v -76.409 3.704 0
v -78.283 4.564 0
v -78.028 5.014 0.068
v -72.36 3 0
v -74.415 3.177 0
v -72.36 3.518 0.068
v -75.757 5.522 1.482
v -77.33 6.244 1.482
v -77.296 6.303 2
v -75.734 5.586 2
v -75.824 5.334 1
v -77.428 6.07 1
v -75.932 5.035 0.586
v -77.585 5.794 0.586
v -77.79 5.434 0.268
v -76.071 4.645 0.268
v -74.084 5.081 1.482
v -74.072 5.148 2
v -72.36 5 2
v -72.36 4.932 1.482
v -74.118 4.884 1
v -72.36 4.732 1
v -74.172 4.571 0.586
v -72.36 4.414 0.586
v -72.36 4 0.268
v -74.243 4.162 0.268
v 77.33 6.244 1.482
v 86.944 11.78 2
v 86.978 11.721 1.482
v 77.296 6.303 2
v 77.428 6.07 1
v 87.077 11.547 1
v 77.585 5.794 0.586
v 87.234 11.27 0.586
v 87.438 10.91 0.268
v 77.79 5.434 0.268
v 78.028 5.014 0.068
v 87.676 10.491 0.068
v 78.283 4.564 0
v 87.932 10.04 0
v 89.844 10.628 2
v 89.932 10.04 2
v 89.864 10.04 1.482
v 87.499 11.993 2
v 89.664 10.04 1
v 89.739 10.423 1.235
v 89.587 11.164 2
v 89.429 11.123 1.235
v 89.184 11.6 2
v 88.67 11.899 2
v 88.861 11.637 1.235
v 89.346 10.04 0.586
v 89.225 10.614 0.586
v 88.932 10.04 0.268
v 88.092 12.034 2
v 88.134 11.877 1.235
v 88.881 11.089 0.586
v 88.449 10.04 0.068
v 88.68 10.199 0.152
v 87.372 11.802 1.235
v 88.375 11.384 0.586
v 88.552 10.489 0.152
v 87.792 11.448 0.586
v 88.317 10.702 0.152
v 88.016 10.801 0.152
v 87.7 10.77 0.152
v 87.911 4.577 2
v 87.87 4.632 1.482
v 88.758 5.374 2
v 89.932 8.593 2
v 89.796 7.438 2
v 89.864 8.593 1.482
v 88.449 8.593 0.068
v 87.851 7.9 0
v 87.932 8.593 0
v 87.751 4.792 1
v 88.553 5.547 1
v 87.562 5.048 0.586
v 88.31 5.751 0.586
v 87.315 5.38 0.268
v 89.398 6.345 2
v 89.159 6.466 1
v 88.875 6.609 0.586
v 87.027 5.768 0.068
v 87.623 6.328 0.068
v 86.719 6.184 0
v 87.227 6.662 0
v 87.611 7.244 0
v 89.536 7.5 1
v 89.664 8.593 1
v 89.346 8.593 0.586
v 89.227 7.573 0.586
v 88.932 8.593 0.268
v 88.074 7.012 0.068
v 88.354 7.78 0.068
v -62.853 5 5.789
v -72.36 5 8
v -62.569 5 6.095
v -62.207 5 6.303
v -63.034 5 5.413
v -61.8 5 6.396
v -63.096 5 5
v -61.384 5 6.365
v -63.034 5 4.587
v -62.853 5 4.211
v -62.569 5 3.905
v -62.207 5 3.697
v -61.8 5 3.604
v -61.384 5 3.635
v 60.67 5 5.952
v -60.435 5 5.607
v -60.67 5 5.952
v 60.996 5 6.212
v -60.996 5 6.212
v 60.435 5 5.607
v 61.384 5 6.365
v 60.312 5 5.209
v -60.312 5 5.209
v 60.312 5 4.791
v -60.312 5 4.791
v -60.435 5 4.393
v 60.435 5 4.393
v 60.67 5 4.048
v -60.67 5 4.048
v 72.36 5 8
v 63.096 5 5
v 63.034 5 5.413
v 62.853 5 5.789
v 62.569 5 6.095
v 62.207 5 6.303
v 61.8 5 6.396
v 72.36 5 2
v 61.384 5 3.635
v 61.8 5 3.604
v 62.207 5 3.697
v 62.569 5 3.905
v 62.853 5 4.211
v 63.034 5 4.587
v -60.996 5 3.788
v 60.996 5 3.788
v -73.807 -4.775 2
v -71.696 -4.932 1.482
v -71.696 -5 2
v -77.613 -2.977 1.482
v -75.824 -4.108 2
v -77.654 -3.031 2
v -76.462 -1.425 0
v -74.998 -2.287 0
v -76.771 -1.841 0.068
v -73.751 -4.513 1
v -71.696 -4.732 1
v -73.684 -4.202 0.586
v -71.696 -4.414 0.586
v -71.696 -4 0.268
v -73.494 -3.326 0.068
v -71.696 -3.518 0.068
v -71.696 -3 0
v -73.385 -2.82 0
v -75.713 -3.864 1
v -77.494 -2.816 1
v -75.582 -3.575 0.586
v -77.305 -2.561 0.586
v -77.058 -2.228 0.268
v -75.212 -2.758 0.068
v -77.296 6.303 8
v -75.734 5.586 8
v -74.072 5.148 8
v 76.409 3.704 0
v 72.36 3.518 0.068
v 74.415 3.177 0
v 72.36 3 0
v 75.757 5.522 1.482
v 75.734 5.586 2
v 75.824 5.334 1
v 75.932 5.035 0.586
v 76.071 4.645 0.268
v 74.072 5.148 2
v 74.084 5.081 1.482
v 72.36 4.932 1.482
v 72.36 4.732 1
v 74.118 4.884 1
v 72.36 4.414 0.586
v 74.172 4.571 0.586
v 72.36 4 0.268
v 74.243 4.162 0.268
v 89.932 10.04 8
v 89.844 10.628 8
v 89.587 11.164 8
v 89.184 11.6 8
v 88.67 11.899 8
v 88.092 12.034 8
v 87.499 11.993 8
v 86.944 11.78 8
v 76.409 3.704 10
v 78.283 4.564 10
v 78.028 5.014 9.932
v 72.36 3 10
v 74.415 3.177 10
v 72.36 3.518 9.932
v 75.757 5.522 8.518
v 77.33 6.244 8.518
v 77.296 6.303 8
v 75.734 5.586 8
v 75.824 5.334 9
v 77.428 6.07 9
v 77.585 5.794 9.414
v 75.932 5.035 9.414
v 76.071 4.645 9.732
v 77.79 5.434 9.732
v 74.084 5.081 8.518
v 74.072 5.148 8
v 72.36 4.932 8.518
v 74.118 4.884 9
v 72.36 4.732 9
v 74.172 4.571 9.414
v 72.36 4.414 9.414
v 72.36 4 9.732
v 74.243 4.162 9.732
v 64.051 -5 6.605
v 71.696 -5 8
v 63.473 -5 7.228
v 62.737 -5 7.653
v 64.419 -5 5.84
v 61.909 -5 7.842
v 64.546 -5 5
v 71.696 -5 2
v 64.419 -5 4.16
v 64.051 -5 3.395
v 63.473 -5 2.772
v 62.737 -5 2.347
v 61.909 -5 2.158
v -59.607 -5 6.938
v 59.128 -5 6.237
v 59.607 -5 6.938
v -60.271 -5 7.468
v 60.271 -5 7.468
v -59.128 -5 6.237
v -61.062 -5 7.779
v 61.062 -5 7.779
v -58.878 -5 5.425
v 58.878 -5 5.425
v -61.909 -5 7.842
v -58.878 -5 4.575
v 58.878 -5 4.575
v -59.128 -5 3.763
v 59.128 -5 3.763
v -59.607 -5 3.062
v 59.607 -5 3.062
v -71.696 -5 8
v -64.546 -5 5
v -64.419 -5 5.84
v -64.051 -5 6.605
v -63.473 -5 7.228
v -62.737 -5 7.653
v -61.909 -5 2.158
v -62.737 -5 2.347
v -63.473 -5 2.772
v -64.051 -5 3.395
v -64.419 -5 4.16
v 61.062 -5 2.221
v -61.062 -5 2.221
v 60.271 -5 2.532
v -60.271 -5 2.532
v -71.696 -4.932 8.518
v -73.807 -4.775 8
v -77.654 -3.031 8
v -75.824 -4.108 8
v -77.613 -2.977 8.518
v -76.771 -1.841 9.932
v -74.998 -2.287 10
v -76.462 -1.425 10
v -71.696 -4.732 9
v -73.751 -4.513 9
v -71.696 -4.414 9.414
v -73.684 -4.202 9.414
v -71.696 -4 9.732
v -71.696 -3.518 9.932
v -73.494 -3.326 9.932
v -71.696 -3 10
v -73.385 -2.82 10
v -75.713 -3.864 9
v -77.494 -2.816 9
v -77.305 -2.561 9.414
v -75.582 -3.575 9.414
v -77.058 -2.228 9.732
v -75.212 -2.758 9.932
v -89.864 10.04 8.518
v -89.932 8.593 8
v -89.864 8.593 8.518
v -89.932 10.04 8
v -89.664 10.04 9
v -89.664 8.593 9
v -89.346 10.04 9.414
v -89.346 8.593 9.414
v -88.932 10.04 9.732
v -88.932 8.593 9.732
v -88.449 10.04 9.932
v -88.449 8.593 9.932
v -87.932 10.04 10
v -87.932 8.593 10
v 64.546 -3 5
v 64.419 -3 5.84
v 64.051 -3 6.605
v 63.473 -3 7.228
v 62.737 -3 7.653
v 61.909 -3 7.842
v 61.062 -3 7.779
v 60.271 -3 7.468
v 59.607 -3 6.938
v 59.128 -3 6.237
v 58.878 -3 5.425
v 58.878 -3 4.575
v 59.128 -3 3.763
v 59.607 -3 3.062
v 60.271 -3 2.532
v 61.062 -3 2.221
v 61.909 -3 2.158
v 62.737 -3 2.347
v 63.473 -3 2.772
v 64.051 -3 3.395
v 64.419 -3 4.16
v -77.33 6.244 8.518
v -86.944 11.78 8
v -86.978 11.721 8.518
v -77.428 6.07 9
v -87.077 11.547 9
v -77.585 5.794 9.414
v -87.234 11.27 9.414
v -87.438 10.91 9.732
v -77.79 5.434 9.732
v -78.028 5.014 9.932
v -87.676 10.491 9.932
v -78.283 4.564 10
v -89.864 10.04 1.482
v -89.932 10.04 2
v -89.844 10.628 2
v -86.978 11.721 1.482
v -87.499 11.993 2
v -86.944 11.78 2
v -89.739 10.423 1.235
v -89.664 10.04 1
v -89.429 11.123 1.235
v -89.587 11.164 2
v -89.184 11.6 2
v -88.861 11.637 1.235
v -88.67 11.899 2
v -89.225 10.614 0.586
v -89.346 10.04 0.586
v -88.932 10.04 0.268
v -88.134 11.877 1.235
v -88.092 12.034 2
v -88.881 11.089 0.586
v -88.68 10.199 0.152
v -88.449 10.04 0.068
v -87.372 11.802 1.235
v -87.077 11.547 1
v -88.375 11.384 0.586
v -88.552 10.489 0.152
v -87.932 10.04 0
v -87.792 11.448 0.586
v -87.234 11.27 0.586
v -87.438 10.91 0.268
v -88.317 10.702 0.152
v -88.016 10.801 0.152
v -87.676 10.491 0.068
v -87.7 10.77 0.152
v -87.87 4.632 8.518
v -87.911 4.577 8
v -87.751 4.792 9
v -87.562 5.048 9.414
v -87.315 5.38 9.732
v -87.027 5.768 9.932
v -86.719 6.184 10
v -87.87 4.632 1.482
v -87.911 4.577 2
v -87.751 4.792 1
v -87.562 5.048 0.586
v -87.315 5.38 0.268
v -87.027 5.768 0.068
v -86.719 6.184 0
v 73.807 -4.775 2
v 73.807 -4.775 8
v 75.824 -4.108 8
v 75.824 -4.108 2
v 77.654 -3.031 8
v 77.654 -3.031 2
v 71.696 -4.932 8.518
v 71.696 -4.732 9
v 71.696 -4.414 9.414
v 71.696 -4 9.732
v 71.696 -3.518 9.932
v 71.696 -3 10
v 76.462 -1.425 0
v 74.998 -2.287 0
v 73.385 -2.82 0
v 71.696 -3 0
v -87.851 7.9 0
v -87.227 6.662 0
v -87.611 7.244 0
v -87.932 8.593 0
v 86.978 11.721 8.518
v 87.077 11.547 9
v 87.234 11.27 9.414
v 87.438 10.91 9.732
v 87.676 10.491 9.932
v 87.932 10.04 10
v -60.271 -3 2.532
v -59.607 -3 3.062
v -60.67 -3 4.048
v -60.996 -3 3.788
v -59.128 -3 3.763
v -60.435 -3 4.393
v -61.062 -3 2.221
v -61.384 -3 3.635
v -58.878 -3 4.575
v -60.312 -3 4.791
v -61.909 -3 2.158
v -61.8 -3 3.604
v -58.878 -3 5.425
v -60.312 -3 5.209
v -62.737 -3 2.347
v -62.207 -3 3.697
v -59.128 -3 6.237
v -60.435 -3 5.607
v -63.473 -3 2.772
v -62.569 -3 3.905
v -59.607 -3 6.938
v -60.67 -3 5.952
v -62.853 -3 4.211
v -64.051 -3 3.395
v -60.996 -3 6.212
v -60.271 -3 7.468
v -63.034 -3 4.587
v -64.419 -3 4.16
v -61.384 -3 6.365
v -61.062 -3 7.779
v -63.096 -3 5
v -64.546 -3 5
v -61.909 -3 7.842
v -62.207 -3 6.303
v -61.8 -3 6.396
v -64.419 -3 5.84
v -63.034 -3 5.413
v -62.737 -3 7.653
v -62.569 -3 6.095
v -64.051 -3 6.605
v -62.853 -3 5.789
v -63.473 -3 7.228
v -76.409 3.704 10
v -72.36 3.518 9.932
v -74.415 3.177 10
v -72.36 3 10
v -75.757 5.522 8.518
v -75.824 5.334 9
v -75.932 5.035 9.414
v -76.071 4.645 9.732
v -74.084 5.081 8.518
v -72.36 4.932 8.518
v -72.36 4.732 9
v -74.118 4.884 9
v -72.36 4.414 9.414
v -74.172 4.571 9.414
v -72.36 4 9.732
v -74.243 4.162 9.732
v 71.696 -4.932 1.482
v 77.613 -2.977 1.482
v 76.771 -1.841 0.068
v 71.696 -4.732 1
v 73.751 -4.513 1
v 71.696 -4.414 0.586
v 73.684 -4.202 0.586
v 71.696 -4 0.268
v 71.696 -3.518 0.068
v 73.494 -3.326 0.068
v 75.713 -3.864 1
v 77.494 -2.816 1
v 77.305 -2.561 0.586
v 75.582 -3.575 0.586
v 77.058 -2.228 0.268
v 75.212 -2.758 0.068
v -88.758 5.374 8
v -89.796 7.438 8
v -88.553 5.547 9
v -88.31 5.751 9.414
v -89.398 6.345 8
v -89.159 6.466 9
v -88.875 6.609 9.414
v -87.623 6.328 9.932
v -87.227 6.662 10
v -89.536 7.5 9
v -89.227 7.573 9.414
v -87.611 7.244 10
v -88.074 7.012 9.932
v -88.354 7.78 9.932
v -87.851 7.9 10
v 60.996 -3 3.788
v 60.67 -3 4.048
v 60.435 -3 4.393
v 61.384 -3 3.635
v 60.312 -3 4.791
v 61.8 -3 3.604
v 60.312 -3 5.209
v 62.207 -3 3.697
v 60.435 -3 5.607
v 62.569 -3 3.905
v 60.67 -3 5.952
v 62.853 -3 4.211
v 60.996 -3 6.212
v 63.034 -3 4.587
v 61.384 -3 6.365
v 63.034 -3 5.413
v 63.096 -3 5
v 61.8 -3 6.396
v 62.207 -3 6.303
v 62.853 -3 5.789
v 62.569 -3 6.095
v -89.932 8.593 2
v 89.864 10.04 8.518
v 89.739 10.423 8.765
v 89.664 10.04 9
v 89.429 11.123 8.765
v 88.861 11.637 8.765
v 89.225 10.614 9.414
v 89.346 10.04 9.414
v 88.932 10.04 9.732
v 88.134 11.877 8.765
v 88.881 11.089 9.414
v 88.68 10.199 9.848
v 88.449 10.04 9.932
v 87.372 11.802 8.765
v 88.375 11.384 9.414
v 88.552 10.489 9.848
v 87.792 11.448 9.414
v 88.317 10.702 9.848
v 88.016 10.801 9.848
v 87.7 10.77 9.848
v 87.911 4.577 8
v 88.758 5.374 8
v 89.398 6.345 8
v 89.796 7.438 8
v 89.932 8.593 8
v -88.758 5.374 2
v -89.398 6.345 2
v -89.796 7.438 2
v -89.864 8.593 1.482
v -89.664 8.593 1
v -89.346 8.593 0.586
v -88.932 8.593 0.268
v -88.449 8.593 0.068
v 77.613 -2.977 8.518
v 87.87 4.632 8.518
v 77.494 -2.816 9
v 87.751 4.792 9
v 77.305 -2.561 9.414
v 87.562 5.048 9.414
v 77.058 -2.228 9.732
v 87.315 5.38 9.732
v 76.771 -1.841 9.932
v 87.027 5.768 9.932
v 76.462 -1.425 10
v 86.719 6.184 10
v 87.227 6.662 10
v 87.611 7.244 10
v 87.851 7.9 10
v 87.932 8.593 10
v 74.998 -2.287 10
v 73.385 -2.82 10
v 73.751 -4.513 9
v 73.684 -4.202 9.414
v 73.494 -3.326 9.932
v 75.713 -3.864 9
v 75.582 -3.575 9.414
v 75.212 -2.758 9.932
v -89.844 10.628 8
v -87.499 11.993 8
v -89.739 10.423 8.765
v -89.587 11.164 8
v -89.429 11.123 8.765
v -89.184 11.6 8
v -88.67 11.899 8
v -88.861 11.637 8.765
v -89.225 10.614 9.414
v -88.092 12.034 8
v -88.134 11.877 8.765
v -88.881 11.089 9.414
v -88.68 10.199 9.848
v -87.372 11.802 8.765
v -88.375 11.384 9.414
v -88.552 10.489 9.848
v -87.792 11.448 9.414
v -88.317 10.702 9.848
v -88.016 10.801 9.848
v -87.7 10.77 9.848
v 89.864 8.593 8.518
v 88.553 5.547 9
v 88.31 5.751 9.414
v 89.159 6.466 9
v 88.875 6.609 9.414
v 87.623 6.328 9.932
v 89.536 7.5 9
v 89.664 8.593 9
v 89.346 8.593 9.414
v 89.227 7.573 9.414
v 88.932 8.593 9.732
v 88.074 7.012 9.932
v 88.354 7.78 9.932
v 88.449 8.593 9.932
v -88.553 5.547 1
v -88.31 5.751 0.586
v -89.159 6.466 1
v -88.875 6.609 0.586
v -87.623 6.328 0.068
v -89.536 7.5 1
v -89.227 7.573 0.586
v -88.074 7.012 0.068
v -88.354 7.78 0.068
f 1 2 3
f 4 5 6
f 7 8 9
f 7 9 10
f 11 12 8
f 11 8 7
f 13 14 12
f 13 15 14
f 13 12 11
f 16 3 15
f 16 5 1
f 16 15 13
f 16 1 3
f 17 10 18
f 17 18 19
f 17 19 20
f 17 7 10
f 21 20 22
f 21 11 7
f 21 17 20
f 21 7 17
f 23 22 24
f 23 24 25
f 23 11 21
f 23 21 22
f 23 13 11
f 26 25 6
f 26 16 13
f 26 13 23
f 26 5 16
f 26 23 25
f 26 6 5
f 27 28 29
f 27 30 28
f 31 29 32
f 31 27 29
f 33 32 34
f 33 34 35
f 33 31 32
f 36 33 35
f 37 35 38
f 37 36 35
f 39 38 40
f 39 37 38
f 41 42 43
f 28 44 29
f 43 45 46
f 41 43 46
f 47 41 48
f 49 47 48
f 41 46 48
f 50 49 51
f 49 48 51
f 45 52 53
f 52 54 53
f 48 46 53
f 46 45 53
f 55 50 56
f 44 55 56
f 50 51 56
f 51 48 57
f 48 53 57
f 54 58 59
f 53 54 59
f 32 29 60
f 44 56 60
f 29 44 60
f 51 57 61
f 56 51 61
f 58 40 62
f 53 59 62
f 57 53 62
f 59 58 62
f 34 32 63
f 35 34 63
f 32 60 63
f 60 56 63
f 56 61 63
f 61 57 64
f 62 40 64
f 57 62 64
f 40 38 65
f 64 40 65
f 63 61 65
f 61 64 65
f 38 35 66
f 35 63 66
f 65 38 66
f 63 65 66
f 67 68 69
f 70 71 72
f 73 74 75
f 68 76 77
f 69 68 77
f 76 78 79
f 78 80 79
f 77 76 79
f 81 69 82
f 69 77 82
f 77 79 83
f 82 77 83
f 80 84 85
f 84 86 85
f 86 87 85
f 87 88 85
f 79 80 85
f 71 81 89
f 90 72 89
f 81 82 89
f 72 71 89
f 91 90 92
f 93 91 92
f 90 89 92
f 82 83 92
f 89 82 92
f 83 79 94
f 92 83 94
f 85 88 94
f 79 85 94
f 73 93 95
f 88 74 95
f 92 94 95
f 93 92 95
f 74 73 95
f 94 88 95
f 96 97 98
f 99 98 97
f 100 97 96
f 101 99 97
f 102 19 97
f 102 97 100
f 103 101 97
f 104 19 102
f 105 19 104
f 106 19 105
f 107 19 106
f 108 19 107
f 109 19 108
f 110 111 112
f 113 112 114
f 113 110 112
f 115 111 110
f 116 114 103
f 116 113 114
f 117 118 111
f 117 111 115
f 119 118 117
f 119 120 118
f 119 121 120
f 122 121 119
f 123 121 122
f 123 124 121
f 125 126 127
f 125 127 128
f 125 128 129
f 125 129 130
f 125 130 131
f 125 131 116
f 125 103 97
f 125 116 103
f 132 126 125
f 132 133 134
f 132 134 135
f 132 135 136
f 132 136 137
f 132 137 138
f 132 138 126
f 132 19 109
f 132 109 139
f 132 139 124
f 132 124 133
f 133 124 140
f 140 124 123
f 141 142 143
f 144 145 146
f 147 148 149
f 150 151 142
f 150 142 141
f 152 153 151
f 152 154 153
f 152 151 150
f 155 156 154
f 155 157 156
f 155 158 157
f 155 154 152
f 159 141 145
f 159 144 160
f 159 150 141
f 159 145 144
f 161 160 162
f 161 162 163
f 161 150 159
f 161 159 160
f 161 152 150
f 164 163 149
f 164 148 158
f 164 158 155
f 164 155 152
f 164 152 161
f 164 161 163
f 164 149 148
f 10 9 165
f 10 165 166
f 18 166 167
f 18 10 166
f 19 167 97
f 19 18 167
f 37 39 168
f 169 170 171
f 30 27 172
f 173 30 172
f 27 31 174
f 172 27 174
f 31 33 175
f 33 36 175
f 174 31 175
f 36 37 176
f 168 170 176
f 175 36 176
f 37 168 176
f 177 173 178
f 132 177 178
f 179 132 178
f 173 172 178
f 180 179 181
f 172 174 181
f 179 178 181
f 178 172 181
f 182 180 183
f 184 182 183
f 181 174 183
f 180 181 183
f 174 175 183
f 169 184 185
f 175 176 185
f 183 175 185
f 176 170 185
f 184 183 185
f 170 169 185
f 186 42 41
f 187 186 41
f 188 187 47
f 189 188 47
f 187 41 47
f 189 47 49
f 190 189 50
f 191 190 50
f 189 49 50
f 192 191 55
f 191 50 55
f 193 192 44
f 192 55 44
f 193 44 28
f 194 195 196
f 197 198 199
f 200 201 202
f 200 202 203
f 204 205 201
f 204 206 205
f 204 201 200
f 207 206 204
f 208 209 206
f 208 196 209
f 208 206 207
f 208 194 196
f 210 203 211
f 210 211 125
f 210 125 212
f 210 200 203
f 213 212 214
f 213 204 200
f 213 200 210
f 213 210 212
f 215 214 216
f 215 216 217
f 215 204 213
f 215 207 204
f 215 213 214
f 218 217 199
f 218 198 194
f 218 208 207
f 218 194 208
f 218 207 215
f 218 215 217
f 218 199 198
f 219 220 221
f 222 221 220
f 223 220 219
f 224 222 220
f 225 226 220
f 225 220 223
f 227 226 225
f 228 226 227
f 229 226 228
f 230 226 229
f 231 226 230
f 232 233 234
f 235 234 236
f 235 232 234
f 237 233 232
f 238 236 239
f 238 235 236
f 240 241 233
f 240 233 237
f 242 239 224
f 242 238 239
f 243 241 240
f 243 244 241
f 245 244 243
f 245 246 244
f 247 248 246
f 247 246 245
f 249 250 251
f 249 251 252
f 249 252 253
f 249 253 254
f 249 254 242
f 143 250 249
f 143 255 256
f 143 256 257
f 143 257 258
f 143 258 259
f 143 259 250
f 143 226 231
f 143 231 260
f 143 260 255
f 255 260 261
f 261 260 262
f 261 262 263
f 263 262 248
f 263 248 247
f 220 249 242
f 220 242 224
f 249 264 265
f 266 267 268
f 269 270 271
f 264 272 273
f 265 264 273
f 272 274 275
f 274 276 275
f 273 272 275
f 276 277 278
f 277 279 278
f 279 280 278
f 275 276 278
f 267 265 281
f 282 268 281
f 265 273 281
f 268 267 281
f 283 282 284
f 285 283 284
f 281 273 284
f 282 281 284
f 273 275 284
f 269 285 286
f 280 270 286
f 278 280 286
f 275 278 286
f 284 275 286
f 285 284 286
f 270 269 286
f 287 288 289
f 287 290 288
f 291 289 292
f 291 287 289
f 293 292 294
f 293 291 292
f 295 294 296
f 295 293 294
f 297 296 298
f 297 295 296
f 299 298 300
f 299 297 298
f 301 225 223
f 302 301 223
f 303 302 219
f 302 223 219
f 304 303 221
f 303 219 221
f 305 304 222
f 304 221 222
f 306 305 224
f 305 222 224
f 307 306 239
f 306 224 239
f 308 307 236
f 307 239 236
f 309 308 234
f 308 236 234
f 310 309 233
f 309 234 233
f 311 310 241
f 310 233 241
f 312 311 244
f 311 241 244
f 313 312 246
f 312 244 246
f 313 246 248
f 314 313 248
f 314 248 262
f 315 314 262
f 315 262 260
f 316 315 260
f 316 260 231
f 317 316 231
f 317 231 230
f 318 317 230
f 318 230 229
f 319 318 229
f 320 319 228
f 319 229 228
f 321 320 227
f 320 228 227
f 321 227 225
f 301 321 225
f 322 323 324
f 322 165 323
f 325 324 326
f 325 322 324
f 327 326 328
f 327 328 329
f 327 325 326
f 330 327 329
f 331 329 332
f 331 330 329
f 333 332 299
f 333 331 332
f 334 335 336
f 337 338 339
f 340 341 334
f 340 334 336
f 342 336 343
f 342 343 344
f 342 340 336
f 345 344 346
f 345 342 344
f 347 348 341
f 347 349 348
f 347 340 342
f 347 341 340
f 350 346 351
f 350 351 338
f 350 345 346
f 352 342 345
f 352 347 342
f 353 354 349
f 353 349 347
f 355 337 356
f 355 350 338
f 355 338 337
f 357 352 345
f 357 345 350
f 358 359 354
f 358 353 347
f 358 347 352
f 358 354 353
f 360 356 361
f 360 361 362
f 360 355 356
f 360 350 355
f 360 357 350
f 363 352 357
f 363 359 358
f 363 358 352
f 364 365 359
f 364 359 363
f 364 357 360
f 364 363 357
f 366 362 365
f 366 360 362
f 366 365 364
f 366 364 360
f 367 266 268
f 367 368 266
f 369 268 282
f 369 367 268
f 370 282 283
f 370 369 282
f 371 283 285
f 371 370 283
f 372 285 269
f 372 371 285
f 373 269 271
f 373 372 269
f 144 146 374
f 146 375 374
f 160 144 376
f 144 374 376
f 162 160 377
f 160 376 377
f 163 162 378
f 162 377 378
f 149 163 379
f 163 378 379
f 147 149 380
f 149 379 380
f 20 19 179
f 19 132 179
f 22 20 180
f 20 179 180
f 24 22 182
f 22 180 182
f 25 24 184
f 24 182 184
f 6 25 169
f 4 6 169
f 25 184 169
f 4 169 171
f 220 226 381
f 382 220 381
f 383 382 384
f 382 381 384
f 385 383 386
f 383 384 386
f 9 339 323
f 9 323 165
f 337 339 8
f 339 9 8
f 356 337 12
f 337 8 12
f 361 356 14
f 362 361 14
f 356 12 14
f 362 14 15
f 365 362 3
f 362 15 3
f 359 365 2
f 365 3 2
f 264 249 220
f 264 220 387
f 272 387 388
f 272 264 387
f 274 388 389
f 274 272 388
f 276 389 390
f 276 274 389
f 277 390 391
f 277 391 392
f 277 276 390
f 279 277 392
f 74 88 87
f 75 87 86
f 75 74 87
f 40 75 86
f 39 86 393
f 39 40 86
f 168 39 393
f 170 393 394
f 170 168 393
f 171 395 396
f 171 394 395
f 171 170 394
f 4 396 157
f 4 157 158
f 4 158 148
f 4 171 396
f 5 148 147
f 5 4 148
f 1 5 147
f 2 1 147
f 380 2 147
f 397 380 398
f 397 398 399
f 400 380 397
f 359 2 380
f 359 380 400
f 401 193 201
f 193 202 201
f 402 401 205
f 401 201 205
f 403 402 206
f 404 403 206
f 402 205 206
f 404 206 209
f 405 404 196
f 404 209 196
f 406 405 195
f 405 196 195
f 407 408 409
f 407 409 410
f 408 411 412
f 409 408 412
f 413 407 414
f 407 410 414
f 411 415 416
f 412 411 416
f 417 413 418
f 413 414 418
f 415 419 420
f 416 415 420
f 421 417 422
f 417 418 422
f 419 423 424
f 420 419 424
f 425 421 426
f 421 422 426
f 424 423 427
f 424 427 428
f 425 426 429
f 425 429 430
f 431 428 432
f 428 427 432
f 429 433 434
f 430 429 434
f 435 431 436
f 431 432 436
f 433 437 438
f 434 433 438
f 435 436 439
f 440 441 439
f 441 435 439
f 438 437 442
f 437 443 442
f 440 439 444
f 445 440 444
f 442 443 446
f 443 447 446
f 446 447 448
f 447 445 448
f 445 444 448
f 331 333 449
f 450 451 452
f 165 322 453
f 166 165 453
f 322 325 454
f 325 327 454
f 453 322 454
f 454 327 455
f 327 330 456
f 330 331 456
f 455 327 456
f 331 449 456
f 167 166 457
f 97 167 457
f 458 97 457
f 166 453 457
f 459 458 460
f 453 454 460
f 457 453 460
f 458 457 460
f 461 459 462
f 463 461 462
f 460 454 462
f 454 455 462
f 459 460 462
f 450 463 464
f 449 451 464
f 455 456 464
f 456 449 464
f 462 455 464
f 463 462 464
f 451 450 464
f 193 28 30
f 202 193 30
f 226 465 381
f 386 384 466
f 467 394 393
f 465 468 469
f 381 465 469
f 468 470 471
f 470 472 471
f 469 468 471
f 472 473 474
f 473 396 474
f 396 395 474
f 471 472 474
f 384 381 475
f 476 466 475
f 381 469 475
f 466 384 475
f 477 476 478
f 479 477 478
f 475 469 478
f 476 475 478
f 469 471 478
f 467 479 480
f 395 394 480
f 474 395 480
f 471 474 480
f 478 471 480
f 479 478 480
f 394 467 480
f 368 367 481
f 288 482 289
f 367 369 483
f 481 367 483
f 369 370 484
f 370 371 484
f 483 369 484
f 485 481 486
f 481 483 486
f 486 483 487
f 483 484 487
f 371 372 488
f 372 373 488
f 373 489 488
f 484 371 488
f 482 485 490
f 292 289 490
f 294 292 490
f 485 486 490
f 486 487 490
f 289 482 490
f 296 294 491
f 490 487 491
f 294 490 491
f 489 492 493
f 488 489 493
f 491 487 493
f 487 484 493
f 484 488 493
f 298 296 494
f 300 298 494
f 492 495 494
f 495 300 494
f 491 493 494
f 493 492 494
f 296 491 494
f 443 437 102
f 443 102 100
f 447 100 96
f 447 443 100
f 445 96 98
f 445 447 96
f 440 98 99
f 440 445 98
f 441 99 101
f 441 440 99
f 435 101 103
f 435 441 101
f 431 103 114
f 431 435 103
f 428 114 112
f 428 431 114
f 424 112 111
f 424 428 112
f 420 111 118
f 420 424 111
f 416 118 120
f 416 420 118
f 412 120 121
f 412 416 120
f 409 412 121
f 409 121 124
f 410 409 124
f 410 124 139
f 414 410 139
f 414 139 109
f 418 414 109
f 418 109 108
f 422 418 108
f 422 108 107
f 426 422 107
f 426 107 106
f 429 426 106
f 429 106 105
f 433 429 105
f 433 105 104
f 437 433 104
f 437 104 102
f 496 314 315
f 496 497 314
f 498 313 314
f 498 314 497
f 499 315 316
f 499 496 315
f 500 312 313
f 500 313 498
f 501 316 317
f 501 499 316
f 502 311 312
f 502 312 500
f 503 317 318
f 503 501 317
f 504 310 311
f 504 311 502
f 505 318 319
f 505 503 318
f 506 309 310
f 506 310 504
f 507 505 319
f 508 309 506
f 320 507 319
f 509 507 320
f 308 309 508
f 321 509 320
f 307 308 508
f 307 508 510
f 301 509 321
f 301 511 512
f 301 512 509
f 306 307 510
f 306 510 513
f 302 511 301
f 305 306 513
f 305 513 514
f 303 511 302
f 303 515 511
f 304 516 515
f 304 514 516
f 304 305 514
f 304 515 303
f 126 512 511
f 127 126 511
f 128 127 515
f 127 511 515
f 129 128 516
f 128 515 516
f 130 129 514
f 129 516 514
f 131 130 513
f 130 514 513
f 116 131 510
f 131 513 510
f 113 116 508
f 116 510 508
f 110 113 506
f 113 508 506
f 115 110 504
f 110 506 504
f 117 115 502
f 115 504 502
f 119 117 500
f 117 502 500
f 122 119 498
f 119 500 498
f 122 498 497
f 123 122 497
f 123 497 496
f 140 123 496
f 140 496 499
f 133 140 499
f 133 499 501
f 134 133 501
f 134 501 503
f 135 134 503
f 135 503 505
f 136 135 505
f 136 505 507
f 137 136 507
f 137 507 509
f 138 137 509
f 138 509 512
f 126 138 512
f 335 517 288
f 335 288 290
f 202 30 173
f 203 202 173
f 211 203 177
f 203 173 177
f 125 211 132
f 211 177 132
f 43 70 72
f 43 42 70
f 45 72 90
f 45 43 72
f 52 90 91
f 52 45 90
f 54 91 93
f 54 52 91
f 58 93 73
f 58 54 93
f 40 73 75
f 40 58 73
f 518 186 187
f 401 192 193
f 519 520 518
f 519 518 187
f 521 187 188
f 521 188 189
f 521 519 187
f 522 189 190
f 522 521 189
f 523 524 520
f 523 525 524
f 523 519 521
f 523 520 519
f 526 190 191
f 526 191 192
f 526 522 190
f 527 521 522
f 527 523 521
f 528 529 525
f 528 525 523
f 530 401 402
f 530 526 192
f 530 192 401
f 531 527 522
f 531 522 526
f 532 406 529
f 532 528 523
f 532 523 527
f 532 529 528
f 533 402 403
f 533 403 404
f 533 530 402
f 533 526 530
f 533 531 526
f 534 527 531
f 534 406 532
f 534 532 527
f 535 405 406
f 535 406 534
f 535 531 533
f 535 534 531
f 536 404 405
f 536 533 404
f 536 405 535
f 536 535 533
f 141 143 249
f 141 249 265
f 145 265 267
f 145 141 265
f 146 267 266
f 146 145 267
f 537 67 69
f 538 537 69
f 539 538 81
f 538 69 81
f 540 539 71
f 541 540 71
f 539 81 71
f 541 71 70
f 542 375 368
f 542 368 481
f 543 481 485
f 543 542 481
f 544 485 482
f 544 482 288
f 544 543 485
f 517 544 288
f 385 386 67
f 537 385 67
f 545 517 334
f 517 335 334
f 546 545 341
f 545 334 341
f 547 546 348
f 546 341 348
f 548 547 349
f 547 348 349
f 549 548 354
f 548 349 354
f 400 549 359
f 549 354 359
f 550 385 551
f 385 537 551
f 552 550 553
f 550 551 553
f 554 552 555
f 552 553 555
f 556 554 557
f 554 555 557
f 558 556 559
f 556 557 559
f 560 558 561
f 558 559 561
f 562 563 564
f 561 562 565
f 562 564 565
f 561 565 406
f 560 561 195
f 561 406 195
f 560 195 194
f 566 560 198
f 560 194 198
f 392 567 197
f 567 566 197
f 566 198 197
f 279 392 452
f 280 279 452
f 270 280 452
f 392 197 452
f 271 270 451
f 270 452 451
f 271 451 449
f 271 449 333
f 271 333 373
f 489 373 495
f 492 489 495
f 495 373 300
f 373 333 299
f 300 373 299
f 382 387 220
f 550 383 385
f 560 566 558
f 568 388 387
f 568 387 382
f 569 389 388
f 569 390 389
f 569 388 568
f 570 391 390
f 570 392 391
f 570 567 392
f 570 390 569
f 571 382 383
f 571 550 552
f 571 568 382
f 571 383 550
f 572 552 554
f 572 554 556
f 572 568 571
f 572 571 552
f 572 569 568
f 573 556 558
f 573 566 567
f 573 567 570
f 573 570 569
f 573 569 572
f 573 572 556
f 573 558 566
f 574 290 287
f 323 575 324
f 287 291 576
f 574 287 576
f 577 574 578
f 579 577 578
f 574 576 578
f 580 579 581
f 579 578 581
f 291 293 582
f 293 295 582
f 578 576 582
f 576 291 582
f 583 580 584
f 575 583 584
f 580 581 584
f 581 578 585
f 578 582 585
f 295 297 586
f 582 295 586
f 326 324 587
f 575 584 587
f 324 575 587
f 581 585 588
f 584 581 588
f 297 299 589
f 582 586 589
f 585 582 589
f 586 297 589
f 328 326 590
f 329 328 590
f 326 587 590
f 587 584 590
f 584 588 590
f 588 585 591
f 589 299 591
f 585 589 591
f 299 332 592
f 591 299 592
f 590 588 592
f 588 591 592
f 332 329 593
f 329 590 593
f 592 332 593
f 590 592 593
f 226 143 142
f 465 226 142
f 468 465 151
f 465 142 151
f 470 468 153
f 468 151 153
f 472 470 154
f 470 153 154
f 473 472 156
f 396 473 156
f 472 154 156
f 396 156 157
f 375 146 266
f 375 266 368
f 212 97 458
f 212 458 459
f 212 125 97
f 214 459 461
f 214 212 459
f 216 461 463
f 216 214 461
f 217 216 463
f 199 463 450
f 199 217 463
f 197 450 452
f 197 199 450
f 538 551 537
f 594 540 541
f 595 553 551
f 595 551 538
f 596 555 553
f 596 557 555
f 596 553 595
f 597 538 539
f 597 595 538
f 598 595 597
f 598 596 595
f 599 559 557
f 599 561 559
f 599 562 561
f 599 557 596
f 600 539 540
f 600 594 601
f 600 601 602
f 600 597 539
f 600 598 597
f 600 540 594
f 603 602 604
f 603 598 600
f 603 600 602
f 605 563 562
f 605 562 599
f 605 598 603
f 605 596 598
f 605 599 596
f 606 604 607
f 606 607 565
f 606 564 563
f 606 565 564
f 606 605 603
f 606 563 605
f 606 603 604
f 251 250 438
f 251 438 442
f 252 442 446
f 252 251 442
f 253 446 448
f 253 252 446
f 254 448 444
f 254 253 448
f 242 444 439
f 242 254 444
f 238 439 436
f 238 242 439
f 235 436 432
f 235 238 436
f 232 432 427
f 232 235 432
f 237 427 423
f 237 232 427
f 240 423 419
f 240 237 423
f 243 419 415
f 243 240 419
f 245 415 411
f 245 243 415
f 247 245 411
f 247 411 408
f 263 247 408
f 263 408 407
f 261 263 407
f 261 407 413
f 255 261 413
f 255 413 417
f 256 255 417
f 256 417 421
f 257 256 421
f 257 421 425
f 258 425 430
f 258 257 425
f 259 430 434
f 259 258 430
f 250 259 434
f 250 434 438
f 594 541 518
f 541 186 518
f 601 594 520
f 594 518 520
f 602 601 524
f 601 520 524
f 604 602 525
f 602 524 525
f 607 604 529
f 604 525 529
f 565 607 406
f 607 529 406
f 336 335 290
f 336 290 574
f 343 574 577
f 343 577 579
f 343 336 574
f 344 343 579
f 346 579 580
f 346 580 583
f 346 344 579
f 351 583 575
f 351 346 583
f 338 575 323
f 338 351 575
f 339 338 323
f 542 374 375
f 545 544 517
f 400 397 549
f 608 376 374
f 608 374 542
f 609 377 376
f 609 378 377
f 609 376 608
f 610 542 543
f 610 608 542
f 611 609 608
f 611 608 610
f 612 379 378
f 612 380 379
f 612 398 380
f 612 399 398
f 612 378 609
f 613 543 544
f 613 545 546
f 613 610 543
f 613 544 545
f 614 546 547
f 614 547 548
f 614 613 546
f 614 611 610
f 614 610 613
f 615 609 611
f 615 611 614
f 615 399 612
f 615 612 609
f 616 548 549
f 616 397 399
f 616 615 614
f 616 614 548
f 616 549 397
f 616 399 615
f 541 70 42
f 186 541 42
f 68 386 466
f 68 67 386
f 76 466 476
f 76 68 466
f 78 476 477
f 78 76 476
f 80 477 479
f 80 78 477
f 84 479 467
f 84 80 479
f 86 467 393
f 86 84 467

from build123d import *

# Parameters (mm, degrees)
F1_DEPTH = 10
F2_R     = 2
F3_R     = 1.4
F4_DEPTH = 11
F3_R_2   = 2.85
F5_DEPTH = 2


with BuildPart() as f1:
    # F0 (on Top) → F1 (new body)
    with BuildSketch(Plane.XY):
        with BuildLine():
            ThreePointArc((77.2961207269, 6.3033039919), (74.9125256302, 5.3313144616), (72.3597780987, 5))
            Line((72.3597780987, 5), (0, 5))
            Line((0, 5), (0, -5))
            Line((0, -5), (71.6958680115, -5))
            ThreePointArc((71.6958680115, -5), (74.8331804116, -4.495118267), (77.6536984673, -3.0314541808))
            Line((77.6536984673, -3.0314541808), (87.9106565848, 4.5772821801))
            ThreePointArc((87.9106565848, 4.5772821801), (89.3979800506, 6.3451854495), (89.9317413568, 8.5930092705))
            Line((89.9317413568, 8.5930092705), (89.9317413568, 10.0404781398))
            ThreePointArc((89.9317413568, 10.0404781398), (88.9380869607, 11.7688497797), (86.9444728312, 11.7798173414))
            Line((86.9444728312, 11.7798173414), (77.2961207269, 6.3033039919))
        make_face()
    extrude(amount=F1_DEPTH)

    # F2
    f2_edges = [f1.edges().sort_by_distance(p)[0] for p in [
        (35.847934, -5, 10),
        (35.847934, -5, 0),
    ]]
    fillet(f2_edges, radius=F2_R)

    # F3 (on face) → F4 (cut)
    with BuildSketch(Plane.XZ.offset(5)):
        with Locations((61.6958680115, 5)):
            Circle(F3_R)
    extrude(amount=-F4_DEPTH, mode=Mode.SUBTRACT)

    # F3 (on face) → F5 (cut)
    with BuildSketch(Plane.XZ.offset(5)):
        with Locations((61.6958680115, 5)):
            Circle(F3_R_2)
        with Locations((61.6958680115, 5)):
            Circle(F3_R, mode=Mode.SUBTRACT)
    extrude(amount=-F5_DEPTH, mode=Mode.SUBTRACT)

    # F6: F1 across plane


with BuildPart() as f1_1:
    add(f1.part)
    add(f1.part.mirror(Plane.YZ))


solid = f1_1.part
